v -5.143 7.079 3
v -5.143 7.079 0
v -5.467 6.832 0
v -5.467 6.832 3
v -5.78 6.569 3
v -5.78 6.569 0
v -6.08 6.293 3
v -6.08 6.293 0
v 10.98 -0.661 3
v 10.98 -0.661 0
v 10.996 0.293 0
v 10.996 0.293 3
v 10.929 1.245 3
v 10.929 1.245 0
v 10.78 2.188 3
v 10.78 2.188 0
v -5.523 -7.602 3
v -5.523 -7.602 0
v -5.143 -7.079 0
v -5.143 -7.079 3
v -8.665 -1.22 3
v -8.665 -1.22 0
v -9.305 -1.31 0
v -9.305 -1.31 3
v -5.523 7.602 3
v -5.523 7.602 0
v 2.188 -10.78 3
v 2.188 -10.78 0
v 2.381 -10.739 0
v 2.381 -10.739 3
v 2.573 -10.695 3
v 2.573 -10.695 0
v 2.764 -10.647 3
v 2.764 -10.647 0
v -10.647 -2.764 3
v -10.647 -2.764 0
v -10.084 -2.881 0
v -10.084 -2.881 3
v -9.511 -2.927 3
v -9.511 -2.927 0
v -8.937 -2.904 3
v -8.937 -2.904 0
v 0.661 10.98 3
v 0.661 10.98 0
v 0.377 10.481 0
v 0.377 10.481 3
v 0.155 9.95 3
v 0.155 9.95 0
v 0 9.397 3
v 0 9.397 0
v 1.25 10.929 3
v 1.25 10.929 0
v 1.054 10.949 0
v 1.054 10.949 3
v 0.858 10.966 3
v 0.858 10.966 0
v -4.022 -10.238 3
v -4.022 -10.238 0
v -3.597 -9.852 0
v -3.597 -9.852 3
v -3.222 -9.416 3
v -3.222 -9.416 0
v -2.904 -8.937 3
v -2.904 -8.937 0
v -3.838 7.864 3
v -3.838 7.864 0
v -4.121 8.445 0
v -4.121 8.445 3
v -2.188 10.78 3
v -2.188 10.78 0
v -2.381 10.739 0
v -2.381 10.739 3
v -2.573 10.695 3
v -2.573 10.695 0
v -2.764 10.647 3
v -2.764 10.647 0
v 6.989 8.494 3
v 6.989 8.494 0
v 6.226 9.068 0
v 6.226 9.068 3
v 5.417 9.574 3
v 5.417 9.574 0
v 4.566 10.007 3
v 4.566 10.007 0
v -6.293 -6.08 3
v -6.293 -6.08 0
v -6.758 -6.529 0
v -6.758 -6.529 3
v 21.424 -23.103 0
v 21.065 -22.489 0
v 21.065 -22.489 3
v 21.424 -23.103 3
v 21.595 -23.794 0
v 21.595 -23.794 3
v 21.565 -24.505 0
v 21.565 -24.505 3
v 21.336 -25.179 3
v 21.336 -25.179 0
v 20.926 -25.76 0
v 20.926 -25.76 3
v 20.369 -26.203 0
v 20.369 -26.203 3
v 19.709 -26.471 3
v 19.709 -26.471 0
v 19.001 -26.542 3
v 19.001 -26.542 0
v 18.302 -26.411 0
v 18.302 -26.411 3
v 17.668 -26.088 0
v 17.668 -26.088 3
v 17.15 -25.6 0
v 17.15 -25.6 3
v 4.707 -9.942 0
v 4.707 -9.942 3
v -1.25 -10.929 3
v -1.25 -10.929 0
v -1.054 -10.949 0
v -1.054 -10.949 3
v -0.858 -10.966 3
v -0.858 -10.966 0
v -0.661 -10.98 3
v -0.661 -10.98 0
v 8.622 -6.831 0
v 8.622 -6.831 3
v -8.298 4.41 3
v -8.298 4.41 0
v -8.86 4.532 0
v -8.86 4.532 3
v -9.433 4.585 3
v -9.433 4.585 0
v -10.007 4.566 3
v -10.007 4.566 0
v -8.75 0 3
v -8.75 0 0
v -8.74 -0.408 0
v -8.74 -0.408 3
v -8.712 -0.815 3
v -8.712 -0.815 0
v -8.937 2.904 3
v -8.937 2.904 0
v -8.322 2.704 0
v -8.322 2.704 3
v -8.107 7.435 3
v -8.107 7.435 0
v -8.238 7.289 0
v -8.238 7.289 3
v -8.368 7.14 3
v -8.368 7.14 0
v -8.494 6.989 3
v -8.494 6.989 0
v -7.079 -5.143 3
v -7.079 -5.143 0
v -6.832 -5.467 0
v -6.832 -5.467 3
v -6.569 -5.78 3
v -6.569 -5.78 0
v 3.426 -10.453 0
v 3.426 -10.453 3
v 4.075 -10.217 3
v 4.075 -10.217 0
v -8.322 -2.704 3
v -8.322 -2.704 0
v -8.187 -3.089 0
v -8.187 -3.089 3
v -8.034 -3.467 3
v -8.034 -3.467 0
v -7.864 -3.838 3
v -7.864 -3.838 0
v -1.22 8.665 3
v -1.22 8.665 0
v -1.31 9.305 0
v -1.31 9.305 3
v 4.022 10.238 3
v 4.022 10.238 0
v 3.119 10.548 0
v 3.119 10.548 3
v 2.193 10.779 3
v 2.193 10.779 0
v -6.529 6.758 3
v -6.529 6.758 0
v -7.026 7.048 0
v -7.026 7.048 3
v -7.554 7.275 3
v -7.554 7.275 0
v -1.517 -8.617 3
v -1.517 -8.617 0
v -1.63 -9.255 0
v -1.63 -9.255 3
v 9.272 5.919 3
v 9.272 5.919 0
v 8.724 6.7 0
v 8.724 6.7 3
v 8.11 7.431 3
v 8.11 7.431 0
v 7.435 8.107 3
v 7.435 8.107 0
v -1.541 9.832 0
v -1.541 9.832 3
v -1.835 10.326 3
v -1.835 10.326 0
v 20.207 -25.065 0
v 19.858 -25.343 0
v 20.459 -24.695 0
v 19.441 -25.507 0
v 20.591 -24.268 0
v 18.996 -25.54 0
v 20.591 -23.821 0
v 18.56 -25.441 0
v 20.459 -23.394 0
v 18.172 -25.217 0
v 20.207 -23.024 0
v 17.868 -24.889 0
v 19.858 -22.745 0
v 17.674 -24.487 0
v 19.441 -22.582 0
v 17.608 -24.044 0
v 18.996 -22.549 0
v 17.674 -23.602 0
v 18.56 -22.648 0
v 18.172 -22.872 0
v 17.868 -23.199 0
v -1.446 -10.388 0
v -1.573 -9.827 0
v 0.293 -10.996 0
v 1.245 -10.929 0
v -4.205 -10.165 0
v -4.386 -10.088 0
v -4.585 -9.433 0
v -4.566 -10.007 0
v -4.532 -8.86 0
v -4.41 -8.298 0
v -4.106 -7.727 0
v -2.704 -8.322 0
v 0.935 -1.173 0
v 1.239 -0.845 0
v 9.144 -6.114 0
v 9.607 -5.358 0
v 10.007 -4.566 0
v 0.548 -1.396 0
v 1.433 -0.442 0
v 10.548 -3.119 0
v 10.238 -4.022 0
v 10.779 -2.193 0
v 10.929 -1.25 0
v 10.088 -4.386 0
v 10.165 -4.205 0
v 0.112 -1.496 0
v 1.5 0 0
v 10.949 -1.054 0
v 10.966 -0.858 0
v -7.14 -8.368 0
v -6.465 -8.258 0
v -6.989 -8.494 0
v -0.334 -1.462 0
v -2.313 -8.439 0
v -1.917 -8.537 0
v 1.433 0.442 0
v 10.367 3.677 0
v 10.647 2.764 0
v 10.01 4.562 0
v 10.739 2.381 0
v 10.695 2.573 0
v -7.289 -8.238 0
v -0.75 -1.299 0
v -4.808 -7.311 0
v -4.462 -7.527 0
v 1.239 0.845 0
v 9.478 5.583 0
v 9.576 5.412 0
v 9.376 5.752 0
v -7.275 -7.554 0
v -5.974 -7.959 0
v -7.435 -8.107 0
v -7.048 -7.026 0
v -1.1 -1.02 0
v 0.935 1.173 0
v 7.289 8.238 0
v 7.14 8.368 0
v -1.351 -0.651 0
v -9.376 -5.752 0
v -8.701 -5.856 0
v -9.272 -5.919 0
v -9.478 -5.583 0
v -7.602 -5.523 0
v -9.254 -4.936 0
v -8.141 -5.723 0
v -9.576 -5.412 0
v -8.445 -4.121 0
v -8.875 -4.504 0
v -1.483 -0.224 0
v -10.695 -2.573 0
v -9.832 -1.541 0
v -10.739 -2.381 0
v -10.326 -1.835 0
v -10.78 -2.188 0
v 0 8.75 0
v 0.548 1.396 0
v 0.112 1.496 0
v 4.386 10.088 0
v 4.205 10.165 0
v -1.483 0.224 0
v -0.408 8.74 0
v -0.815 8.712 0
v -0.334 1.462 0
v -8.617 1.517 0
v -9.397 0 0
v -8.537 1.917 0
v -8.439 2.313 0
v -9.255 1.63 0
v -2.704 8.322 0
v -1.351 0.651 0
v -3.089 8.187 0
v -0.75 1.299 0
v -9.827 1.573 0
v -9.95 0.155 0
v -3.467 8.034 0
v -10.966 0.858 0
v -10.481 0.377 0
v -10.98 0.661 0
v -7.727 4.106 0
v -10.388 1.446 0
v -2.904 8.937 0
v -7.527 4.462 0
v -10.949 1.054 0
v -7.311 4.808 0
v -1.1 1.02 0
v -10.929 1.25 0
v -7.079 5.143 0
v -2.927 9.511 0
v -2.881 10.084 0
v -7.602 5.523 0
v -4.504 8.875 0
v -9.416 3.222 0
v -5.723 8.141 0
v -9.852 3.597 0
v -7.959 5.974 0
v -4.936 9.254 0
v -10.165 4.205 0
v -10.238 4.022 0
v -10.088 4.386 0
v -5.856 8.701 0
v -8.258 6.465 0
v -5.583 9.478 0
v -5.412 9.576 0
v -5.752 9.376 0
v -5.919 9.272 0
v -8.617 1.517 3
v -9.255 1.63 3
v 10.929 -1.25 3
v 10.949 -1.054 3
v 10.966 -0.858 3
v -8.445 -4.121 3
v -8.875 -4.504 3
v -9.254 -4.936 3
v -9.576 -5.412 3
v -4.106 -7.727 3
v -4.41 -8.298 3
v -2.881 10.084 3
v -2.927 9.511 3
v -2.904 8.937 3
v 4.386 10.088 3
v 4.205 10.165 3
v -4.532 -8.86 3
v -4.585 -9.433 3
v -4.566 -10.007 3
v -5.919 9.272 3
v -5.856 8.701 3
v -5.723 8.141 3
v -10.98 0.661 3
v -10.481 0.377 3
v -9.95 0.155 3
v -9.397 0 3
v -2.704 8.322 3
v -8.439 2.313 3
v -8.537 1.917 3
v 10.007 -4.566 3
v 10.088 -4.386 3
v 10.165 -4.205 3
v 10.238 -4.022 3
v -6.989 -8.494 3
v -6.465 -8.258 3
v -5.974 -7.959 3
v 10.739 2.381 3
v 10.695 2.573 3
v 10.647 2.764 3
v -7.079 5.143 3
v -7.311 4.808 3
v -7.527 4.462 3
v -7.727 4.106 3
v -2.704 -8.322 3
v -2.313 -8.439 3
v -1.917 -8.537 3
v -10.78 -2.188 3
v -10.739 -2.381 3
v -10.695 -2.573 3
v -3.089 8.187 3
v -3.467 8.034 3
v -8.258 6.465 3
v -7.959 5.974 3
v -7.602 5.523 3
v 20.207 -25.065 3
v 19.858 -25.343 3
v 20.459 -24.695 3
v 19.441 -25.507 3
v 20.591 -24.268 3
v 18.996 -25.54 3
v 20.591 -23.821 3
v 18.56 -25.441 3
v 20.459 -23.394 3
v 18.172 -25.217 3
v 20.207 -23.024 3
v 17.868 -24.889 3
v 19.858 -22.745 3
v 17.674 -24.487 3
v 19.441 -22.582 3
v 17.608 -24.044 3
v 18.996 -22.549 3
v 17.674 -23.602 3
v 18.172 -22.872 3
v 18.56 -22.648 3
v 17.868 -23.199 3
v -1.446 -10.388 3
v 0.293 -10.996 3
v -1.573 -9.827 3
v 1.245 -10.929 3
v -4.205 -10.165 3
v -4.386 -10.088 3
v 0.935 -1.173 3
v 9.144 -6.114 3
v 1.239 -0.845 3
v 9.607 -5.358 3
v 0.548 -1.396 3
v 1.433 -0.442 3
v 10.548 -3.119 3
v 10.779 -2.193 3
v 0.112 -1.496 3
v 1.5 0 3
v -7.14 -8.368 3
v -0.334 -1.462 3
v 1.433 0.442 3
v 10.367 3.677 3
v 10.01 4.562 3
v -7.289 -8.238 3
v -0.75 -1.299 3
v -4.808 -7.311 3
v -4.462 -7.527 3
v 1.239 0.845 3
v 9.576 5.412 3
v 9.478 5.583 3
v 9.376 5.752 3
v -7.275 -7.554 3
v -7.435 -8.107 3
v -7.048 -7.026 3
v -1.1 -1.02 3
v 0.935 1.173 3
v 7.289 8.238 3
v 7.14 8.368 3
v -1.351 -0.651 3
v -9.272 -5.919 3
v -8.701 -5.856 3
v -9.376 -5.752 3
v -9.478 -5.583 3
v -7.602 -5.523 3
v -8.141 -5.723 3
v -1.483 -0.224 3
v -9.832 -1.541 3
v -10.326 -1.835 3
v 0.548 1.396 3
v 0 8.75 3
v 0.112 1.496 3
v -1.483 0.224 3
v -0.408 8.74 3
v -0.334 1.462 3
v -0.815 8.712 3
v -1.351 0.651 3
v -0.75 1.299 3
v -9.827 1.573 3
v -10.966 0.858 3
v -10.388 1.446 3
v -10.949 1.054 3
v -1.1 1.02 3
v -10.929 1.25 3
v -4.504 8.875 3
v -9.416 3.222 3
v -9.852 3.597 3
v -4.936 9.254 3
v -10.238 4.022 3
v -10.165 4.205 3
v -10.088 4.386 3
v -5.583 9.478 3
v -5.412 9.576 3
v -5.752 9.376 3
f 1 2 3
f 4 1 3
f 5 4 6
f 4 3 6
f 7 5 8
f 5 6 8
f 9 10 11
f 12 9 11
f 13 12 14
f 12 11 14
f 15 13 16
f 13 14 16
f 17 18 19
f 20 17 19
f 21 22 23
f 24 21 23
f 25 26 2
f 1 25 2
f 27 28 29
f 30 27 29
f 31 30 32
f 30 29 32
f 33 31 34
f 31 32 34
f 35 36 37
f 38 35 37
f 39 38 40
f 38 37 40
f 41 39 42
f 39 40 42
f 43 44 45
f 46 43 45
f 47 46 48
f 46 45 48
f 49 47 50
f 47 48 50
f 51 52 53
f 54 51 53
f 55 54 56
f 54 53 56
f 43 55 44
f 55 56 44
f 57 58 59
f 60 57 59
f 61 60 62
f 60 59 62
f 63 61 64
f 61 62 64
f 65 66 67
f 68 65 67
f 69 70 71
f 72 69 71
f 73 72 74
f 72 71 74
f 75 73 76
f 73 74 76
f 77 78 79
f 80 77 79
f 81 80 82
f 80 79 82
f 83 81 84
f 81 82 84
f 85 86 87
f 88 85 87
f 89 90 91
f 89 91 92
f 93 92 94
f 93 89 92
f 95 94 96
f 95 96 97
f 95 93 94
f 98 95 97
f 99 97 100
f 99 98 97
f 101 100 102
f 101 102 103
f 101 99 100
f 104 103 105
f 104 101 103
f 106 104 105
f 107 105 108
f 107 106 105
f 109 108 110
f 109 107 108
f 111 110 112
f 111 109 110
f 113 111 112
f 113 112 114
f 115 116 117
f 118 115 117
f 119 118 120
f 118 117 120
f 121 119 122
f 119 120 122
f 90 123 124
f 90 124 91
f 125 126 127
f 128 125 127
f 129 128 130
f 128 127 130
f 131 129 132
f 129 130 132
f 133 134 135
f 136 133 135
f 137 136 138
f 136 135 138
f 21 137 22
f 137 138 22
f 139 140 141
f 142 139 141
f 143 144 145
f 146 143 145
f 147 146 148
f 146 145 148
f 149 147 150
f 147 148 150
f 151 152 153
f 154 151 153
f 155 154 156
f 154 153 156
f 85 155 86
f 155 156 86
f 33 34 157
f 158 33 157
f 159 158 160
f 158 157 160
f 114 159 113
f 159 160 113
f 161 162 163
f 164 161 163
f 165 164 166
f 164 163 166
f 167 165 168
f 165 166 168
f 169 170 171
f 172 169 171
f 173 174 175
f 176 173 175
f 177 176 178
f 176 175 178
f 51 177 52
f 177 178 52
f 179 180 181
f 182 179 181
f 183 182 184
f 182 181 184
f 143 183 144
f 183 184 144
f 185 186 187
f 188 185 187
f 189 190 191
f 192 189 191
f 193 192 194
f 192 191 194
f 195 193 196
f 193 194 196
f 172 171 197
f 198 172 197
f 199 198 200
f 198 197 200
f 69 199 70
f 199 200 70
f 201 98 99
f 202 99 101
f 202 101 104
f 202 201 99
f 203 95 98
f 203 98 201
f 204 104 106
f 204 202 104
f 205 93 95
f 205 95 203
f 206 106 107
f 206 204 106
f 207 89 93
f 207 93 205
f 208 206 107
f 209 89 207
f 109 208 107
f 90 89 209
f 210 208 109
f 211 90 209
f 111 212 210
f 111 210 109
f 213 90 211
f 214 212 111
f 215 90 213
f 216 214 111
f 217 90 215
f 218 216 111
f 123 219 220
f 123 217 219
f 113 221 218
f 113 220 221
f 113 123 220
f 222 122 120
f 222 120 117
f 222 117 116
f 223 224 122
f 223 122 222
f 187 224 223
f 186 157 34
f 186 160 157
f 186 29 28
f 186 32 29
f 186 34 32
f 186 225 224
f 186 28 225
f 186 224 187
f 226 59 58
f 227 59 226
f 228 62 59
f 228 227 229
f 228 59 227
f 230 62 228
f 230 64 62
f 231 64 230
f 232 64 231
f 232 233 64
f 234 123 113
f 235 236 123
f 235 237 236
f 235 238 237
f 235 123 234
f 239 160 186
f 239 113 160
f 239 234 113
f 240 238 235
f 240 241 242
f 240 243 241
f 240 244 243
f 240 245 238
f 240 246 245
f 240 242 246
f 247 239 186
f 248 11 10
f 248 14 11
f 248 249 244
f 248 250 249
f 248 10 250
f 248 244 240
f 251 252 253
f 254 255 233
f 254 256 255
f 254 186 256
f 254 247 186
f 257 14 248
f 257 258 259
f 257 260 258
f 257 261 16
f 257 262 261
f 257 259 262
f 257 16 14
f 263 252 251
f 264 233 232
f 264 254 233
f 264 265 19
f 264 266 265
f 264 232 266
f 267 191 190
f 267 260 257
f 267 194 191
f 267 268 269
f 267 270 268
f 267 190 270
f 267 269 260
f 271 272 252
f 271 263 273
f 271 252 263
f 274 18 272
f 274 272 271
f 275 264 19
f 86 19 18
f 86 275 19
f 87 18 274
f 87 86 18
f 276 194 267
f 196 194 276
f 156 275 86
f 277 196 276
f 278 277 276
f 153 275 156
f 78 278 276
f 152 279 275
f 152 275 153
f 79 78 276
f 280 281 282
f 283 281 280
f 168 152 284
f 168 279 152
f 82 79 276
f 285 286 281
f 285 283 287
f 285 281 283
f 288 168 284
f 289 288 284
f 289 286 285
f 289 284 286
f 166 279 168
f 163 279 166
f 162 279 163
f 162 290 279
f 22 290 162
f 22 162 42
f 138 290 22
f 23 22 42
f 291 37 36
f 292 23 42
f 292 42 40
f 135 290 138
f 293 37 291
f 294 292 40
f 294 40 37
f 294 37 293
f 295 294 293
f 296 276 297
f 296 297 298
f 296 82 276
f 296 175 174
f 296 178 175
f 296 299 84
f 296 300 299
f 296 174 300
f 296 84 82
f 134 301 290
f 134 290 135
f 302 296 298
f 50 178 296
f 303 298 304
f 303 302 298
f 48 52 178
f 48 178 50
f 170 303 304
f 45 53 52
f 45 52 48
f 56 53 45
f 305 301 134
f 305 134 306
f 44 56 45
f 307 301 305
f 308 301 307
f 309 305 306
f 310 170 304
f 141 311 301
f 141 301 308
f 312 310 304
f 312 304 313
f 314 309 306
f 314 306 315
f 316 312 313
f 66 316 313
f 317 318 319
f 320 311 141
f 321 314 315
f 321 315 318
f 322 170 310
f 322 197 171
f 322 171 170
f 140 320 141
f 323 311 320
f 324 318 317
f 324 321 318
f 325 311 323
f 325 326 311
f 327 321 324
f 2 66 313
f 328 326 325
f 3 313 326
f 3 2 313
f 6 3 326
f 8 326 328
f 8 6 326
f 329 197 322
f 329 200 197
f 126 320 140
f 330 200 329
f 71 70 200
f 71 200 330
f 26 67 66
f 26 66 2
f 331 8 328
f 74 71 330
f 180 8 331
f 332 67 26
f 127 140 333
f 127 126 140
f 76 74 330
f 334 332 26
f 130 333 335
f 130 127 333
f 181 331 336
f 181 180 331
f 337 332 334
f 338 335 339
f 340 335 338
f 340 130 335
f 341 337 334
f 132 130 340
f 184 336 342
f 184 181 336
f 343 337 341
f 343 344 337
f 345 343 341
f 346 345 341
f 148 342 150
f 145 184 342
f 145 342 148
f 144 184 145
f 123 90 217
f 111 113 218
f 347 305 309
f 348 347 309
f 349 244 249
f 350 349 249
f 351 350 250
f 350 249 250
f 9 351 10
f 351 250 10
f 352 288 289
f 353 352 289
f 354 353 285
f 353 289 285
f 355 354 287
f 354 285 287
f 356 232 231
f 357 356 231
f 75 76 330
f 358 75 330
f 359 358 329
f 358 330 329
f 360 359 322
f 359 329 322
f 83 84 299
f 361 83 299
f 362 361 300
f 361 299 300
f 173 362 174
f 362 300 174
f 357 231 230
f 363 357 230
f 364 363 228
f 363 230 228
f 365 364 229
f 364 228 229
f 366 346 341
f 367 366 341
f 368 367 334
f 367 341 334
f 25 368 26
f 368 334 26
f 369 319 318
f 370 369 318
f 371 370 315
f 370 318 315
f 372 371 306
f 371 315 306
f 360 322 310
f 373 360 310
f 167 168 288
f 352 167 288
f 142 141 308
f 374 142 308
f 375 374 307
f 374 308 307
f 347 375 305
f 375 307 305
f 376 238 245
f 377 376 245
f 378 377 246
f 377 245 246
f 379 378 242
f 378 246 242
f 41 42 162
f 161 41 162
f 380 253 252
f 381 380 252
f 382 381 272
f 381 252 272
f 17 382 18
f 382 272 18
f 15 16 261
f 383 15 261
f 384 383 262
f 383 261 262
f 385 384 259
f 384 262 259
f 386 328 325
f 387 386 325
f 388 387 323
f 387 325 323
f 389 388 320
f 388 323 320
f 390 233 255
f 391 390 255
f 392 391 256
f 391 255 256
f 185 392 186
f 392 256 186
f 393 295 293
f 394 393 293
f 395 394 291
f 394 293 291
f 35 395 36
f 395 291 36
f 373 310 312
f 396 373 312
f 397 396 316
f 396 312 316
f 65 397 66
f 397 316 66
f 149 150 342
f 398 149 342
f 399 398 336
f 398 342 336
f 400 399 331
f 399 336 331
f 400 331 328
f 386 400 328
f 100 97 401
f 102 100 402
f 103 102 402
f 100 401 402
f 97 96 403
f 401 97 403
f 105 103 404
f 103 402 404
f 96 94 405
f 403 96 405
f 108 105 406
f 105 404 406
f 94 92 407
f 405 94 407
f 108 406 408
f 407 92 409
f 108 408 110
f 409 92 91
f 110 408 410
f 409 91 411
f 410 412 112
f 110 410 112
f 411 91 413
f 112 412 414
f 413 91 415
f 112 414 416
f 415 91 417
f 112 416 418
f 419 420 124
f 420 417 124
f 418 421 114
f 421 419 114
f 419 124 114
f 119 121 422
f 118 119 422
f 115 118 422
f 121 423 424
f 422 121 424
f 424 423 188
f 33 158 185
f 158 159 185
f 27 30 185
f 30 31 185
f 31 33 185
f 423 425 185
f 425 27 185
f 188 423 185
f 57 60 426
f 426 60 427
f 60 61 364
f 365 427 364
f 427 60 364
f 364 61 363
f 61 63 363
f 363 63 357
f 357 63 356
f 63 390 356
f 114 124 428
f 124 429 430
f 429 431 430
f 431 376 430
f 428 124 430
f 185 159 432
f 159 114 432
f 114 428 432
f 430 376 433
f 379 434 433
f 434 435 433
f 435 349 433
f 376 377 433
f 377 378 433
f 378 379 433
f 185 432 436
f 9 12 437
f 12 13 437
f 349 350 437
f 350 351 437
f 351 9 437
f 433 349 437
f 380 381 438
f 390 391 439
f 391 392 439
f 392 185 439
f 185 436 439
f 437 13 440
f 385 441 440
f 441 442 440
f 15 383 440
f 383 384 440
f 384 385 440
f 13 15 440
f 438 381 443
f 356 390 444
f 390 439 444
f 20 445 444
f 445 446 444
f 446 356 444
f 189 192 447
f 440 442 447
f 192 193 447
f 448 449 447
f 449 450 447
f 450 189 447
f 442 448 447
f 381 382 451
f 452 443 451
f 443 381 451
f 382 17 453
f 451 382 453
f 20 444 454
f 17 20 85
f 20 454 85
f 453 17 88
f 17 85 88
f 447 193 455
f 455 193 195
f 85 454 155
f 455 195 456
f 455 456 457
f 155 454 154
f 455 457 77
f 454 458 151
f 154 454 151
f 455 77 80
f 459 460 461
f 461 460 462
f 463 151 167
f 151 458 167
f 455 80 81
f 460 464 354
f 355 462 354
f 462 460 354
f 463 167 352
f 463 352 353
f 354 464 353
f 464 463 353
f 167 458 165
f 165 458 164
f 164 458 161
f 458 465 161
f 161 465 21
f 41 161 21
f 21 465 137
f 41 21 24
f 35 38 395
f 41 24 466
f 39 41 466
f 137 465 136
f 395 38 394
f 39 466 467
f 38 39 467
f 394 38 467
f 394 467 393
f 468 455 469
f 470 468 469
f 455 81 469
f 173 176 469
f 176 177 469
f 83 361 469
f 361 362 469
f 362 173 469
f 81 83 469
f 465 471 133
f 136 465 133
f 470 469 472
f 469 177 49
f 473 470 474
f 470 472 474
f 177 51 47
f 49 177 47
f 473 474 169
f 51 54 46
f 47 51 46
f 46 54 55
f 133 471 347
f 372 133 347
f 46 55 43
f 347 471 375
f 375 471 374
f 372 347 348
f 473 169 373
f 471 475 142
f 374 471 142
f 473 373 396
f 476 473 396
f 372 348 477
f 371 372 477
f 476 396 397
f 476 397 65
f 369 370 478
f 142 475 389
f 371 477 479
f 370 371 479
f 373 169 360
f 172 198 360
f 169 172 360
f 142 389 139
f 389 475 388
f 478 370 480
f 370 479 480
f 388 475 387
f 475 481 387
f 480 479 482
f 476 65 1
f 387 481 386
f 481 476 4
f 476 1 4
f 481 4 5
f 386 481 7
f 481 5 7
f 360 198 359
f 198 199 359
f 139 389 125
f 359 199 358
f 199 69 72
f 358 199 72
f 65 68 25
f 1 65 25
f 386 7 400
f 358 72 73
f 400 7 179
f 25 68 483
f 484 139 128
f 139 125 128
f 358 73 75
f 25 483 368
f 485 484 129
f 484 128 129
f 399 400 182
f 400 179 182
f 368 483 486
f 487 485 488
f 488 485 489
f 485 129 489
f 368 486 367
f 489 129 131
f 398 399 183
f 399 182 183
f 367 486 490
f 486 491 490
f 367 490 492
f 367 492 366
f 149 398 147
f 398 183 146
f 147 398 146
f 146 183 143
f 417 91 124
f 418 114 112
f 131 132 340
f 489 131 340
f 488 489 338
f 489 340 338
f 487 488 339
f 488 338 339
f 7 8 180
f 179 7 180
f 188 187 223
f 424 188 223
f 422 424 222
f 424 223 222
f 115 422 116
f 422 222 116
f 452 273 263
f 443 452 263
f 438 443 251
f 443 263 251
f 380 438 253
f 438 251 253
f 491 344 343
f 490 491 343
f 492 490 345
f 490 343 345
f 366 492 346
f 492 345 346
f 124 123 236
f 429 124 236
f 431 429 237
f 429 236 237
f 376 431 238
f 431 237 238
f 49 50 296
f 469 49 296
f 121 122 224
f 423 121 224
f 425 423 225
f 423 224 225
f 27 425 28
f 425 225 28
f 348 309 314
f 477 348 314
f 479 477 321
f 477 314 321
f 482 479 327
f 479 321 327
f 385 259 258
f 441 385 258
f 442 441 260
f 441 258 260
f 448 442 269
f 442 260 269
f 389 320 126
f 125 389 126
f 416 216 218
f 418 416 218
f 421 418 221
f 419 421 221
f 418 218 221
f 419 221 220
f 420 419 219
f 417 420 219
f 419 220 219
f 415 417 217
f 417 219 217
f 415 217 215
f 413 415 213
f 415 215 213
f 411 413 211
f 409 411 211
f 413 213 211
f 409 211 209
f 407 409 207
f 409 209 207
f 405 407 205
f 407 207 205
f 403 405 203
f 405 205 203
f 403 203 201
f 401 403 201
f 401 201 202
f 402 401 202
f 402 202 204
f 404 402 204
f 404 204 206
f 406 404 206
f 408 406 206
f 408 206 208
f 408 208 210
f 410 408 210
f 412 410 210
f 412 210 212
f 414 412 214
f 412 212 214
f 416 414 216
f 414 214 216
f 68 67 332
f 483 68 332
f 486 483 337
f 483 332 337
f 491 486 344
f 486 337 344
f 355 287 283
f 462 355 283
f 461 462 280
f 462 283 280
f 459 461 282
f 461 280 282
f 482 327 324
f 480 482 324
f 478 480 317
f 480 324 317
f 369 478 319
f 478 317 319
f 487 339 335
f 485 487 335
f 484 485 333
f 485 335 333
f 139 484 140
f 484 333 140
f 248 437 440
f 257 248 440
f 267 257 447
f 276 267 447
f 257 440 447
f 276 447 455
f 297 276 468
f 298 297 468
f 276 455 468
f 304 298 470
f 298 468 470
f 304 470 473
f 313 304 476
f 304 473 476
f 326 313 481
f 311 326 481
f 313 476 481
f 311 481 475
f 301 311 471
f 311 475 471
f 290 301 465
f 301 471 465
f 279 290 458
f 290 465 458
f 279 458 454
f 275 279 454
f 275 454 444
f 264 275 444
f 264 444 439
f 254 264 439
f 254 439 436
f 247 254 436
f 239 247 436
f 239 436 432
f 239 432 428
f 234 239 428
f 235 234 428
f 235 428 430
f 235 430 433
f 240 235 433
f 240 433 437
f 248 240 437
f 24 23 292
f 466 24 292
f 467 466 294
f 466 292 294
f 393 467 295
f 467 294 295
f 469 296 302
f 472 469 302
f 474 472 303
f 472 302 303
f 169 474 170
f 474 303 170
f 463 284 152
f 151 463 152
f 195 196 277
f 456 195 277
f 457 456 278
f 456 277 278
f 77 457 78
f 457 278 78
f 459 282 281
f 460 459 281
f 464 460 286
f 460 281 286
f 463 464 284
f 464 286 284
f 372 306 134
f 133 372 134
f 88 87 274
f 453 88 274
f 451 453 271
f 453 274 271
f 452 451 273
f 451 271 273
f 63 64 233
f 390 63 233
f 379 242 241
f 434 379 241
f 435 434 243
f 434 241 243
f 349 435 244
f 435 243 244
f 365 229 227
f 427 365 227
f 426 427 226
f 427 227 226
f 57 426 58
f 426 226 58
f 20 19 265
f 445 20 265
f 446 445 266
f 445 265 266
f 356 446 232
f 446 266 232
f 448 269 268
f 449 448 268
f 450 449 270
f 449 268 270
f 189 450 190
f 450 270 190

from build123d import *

# Parameters (mm, degrees)
EXTRUSION_DENTS_DEPTH        = 3
R_P_TITION_CIRCULAIRE2_COUNT = 20
ESQUISSE1_R                  = 8.75
EXTRUSION_DISQUE_DEPTH       = 3
BOSS_EXTRU_1_DEPTH           = 3
ESQUISSE6_R                  = 1.5
BOSS_EXTRU_2_DEPTH           = 3
ESQUISSE3_R                  = 1.5
ENL_V_MAT_EXTRU_1_DEPTH      = 35.358346143


with BuildPart() as part:
    # Esquisse2 → Extrusion dents (new body)
    with BuildSketch(Plane.XY):
        with BuildLine():
            Line((0, 9.396926208), (0, 8.75))
            ThreePointArc((0, 8.75), (0.761630034, 8.716789529), (1.517478561, 8.617410215))
            Line((1.517478561, 8.617410215), (1.629672464, 9.254533474))
            ThreePointArc((1.629672464, 9.254533474), (1.517874028, 10.109272502), (1.250299377, 10.928712251))
            ThreePointArc((1.250299377, 10.928712251), (0.956235935, 10.958358127), (0.661482168, 10.980092957))
            ThreePointArc((0.661482168, 10.980092957), (0.25763458, 10.219055101), (0, 9.396926208))
        make_face()
    extrude(amount=EXTRUSION_DENTS_DEPTH)


with BuildPart() as r_p_tition_circulaire2_1:
    # Répétition circulaire2: pattern copy
    add(part.part.rotate(Axis((0, 0, 0), (0, 0, 1)), 1 * 360 / R_P_TITION_CIRCULAIRE2_COUNT))


with BuildPart() as r_p_tition_circulaire2_2:
    # Répétition circulaire2: pattern copy
    add(part.part.rotate(Axis((0, 0, 0), (0, 0, 1)), 2 * 360 / R_P_TITION_CIRCULAIRE2_COUNT))


with BuildPart() as r_p_tition_circulaire2_3:
    # Répétition circulaire2: pattern copy
    add(part.part.rotate(Axis((0, 0, 0), (0, 0, 1)), 3 * 360 / R_P_TITION_CIRCULAIRE2_COUNT))


with BuildPart() as r_p_tition_circulaire2_4:
    # Répétition circulaire2: pattern copy
    add(part.part.rotate(Axis((0, 0, 0), (0, 0, 1)), 4 * 360 / R_P_TITION_CIRCULAIRE2_COUNT))


with BuildPart() as r_p_tition_circulaire2_5:
    # Répétition circulaire2: pattern copy
    add(part.part.rotate(Axis((0, 0, 0), (0, 0, 1)), 5 * 360 / R_P_TITION_CIRCULAIRE2_COUNT))


with BuildPart() as r_p_tition_circulaire2_6:
    # Répétition circulaire2: pattern copy
    add(part.part.rotate(Axis((0, 0, 0), (0, 0, 1)), 6 * 360 / R_P_TITION_CIRCULAIRE2_COUNT))


with BuildPart() as r_p_tition_circulaire2_7:
    # Répétition circulaire2: pattern copy
    add(part.part.rotate(Axis((0, 0, 0), (0, 0, 1)), 7 * 360 / R_P_TITION_CIRCULAIRE2_COUNT))


with BuildPart() as r_p_tition_circulaire2_8:
    # Répétition circulaire2: pattern copy
    add(part.part.rotate(Axis((0, 0, 0), (0, 0, 1)), 8 * 360 / R_P_TITION_CIRCULAIRE2_COUNT))


with BuildPart() as r_p_tition_circulaire2_9:
    # Répétition circulaire2: pattern copy
    add(part.part.rotate(Axis((0, 0, 0), (0, 0, 1)), 9 * 360 / R_P_TITION_CIRCULAIRE2_COUNT))


with BuildPart() as r_p_tition_circulaire2_10:
    # Répétition circulaire2: pattern copy
    add(part.part.rotate(Axis((0, 0, 0), (0, 0, 1)), 10 * 360 / R_P_TITION_CIRCULAIRE2_COUNT))


with BuildPart() as r_p_tition_circulaire2_11:
    # Répétition circulaire2: pattern copy
    add(part.part.rotate(Axis((0, 0, 0), (0, 0, 1)), 11 * 360 / R_P_TITION_CIRCULAIRE2_COUNT))


with BuildPart() as r_p_tition_circulaire2_12:
    # Répétition circulaire2: pattern copy
    add(part.part.rotate(Axis((0, 0, 0), (0, 0, 1)), 12 * 360 / R_P_TITION_CIRCULAIRE2_COUNT))


with BuildPart() as r_p_tition_circulaire2_13:
    # Répétition circulaire2: pattern copy
    add(part.part.rotate(Axis((0, 0, 0), (0, 0, 1)), 13 * 360 / R_P_TITION_CIRCULAIRE2_COUNT))


with BuildPart() as r_p_tition_circulaire2_14:
    # Répétition circulaire2: pattern copy
    add(part.part.rotate(Axis((0, 0, 0), (0, 0, 1)), 14 * 360 / R_P_TITION_CIRCULAIRE2_COUNT))


with BuildPart() as r_p_tition_circulaire2_15:
    # Répétition circulaire2: pattern copy
    add(part.part.rotate(Axis((0, 0, 0), (0, 0, 1)), 15 * 360 / R_P_TITION_CIRCULAIRE2_COUNT))


with BuildPart() as r_p_tition_circulaire2_16:
    # Répétition circulaire2: pattern copy
    add(part.part.rotate(Axis((0, 0, 0), (0, 0, 1)), 16 * 360 / R_P_TITION_CIRCULAIRE2_COUNT))


with BuildPart() as r_p_tition_circulaire2_17:
    # Répétition circulaire2: pattern copy
    add(part.part.rotate(Axis((0, 0, 0), (0, 0, 1)), 17 * 360 / R_P_TITION_CIRCULAIRE2_COUNT))


with BuildPart() as r_p_tition_circulaire2_18:
    # Répétition circulaire2: pattern copy
    add(part.part.rotate(Axis((0, 0, 0), (0, 0, 1)), 18 * 360 / R_P_TITION_CIRCULAIRE2_COUNT))


with BuildPart() as r_p_tition_circulaire2_19:
    # Répétition circulaire2: pattern copy
    add(part.part.rotate(Axis((0, 0, 0), (0, 0, 1)), 19 * 360 / R_P_TITION_CIRCULAIRE2_COUNT))


with BuildPart() as part_1:
    add(part.part)

    add(r_p_tition_circulaire2_1.part)  # Extrusion disque merges Répétition circulaire2_1

    add(r_p_tition_circulaire2_2.part)  # Extrusion disque merges Répétition circulaire2_2

    add(r_p_tition_circulaire2_3.part)  # Extrusion disque merges Répétition circulaire2_3

    add(r_p_tition_circulaire2_4.part)  # Extrusion disque merges Répétition circulaire2_4

    add(r_p_tition_circulaire2_5.part)  # Extrusion disque merges Répétition circulaire2_5

    add(r_p_tition_circulaire2_6.part)  # Extrusion disque merges Répétition circulaire2_6

    add(r_p_tition_circulaire2_7.part)  # Extrusion disque merges Répétition circulaire2_7

    add(r_p_tition_circulaire2_8.part)  # Extrusion disque merges Répétition circulaire2_8

    add(r_p_tition_circulaire2_9.part)  # Extrusion disque merges Répétition circulaire2_9

    add(r_p_tition_circulaire2_10.part)  # Extrusion disque merges Répétition circulaire2_10

    add(r_p_tition_circulaire2_11.part)  # Extrusion disque merges Répétition circulaire2_11

    add(r_p_tition_circulaire2_12.part)  # Extrusion disque merges Répétition circulaire2_12

    add(r_p_tition_circulaire2_13.part)  # Extrusion disque merges Répétition circulaire2_13

    add(r_p_tition_circulaire2_14.part)  # Extrusion disque merges Répétition circulaire2_14

    add(r_p_tition_circulaire2_15.part)  # Extrusion disque merges Répétition circulaire2_15

    add(r_p_tition_circulaire2_16.part)  # Extrusion disque merges Répétition circulaire2_16

    add(r_p_tition_circulaire2_17.part)  # Extrusion disque merges Répétition circulaire2_17

    add(r_p_tition_circulaire2_18.part)  # Extrusion disque merges Répétition circulaire2_18

    add(r_p_tition_circulaire2_19.part)  # Extrusion disque merges Répétition circulaire2_19
    # Esquisse1 → Extrusion disque (add)
    with BuildSketch(Plane.XY):
        Circle(ESQUISSE1_R)
    extrude(amount=EXTRUSION_DISQUE_DEPTH)

    # Esquisse5 → Boss.-Extru.1 (add)
    with BuildSketch(Plane(origin=(0, 0, 0), x_dir=(-1, 0, 0), z_dir=(0, 0, -1))):
        with BuildLine():
            Line((-0.957126431, 10.958280385), (0.957449481, -10.958252164))
            ThreePointArc((0.957449481, -10.958252164), (-10.958266276, -0.957287956), (-0.957126431, 10.958280385))
        make_face()
    extrude(amount=-BOSS_EXTRU_1_DEPTH)

    # Esquisse6 → Boss.-Extru.2 (add)
    with BuildSketch(Plane(origin=(0, 0, 0), x_dir=(-1, 0, 0), z_dir=(0, 0, -1))):
        with BuildLine():
            Line((-8.621821658, -6.83111933), (-21.064860521, -22.489049712))
            ThreePointArc((-21.064860521, -22.489049712), (-20.662999081, -26.001670868), (-17.150377925, -25.599809428))
            Line((-17.150377925, -25.599809428), (-4.707339063, -9.941879045))
            ThreePointArc((-4.707339063, -9.941879045), (-6.843671374, -8.61186171), (-8.621821658, -6.83111933))
        make_face()
        with Locations((-19.107619223, -24.04442957)):
            Circle(ESQUISSE6_R, mode=Mode.SUBTRACT)
    extrude(amount=-BOSS_EXTRU_2_DEPTH)

    # Esquisse3 → Enlèv. mat.-Extru.1 (cut, through all)
    with BuildSketch(Plane.XY.offset(3)):
        Circle(ESQUISSE3_R)
    extrude(amount=-ENL_V_MAT_EXTRU_1_DEPTH, mode=Mode.SUBTRACT)


solid = part_1.part
